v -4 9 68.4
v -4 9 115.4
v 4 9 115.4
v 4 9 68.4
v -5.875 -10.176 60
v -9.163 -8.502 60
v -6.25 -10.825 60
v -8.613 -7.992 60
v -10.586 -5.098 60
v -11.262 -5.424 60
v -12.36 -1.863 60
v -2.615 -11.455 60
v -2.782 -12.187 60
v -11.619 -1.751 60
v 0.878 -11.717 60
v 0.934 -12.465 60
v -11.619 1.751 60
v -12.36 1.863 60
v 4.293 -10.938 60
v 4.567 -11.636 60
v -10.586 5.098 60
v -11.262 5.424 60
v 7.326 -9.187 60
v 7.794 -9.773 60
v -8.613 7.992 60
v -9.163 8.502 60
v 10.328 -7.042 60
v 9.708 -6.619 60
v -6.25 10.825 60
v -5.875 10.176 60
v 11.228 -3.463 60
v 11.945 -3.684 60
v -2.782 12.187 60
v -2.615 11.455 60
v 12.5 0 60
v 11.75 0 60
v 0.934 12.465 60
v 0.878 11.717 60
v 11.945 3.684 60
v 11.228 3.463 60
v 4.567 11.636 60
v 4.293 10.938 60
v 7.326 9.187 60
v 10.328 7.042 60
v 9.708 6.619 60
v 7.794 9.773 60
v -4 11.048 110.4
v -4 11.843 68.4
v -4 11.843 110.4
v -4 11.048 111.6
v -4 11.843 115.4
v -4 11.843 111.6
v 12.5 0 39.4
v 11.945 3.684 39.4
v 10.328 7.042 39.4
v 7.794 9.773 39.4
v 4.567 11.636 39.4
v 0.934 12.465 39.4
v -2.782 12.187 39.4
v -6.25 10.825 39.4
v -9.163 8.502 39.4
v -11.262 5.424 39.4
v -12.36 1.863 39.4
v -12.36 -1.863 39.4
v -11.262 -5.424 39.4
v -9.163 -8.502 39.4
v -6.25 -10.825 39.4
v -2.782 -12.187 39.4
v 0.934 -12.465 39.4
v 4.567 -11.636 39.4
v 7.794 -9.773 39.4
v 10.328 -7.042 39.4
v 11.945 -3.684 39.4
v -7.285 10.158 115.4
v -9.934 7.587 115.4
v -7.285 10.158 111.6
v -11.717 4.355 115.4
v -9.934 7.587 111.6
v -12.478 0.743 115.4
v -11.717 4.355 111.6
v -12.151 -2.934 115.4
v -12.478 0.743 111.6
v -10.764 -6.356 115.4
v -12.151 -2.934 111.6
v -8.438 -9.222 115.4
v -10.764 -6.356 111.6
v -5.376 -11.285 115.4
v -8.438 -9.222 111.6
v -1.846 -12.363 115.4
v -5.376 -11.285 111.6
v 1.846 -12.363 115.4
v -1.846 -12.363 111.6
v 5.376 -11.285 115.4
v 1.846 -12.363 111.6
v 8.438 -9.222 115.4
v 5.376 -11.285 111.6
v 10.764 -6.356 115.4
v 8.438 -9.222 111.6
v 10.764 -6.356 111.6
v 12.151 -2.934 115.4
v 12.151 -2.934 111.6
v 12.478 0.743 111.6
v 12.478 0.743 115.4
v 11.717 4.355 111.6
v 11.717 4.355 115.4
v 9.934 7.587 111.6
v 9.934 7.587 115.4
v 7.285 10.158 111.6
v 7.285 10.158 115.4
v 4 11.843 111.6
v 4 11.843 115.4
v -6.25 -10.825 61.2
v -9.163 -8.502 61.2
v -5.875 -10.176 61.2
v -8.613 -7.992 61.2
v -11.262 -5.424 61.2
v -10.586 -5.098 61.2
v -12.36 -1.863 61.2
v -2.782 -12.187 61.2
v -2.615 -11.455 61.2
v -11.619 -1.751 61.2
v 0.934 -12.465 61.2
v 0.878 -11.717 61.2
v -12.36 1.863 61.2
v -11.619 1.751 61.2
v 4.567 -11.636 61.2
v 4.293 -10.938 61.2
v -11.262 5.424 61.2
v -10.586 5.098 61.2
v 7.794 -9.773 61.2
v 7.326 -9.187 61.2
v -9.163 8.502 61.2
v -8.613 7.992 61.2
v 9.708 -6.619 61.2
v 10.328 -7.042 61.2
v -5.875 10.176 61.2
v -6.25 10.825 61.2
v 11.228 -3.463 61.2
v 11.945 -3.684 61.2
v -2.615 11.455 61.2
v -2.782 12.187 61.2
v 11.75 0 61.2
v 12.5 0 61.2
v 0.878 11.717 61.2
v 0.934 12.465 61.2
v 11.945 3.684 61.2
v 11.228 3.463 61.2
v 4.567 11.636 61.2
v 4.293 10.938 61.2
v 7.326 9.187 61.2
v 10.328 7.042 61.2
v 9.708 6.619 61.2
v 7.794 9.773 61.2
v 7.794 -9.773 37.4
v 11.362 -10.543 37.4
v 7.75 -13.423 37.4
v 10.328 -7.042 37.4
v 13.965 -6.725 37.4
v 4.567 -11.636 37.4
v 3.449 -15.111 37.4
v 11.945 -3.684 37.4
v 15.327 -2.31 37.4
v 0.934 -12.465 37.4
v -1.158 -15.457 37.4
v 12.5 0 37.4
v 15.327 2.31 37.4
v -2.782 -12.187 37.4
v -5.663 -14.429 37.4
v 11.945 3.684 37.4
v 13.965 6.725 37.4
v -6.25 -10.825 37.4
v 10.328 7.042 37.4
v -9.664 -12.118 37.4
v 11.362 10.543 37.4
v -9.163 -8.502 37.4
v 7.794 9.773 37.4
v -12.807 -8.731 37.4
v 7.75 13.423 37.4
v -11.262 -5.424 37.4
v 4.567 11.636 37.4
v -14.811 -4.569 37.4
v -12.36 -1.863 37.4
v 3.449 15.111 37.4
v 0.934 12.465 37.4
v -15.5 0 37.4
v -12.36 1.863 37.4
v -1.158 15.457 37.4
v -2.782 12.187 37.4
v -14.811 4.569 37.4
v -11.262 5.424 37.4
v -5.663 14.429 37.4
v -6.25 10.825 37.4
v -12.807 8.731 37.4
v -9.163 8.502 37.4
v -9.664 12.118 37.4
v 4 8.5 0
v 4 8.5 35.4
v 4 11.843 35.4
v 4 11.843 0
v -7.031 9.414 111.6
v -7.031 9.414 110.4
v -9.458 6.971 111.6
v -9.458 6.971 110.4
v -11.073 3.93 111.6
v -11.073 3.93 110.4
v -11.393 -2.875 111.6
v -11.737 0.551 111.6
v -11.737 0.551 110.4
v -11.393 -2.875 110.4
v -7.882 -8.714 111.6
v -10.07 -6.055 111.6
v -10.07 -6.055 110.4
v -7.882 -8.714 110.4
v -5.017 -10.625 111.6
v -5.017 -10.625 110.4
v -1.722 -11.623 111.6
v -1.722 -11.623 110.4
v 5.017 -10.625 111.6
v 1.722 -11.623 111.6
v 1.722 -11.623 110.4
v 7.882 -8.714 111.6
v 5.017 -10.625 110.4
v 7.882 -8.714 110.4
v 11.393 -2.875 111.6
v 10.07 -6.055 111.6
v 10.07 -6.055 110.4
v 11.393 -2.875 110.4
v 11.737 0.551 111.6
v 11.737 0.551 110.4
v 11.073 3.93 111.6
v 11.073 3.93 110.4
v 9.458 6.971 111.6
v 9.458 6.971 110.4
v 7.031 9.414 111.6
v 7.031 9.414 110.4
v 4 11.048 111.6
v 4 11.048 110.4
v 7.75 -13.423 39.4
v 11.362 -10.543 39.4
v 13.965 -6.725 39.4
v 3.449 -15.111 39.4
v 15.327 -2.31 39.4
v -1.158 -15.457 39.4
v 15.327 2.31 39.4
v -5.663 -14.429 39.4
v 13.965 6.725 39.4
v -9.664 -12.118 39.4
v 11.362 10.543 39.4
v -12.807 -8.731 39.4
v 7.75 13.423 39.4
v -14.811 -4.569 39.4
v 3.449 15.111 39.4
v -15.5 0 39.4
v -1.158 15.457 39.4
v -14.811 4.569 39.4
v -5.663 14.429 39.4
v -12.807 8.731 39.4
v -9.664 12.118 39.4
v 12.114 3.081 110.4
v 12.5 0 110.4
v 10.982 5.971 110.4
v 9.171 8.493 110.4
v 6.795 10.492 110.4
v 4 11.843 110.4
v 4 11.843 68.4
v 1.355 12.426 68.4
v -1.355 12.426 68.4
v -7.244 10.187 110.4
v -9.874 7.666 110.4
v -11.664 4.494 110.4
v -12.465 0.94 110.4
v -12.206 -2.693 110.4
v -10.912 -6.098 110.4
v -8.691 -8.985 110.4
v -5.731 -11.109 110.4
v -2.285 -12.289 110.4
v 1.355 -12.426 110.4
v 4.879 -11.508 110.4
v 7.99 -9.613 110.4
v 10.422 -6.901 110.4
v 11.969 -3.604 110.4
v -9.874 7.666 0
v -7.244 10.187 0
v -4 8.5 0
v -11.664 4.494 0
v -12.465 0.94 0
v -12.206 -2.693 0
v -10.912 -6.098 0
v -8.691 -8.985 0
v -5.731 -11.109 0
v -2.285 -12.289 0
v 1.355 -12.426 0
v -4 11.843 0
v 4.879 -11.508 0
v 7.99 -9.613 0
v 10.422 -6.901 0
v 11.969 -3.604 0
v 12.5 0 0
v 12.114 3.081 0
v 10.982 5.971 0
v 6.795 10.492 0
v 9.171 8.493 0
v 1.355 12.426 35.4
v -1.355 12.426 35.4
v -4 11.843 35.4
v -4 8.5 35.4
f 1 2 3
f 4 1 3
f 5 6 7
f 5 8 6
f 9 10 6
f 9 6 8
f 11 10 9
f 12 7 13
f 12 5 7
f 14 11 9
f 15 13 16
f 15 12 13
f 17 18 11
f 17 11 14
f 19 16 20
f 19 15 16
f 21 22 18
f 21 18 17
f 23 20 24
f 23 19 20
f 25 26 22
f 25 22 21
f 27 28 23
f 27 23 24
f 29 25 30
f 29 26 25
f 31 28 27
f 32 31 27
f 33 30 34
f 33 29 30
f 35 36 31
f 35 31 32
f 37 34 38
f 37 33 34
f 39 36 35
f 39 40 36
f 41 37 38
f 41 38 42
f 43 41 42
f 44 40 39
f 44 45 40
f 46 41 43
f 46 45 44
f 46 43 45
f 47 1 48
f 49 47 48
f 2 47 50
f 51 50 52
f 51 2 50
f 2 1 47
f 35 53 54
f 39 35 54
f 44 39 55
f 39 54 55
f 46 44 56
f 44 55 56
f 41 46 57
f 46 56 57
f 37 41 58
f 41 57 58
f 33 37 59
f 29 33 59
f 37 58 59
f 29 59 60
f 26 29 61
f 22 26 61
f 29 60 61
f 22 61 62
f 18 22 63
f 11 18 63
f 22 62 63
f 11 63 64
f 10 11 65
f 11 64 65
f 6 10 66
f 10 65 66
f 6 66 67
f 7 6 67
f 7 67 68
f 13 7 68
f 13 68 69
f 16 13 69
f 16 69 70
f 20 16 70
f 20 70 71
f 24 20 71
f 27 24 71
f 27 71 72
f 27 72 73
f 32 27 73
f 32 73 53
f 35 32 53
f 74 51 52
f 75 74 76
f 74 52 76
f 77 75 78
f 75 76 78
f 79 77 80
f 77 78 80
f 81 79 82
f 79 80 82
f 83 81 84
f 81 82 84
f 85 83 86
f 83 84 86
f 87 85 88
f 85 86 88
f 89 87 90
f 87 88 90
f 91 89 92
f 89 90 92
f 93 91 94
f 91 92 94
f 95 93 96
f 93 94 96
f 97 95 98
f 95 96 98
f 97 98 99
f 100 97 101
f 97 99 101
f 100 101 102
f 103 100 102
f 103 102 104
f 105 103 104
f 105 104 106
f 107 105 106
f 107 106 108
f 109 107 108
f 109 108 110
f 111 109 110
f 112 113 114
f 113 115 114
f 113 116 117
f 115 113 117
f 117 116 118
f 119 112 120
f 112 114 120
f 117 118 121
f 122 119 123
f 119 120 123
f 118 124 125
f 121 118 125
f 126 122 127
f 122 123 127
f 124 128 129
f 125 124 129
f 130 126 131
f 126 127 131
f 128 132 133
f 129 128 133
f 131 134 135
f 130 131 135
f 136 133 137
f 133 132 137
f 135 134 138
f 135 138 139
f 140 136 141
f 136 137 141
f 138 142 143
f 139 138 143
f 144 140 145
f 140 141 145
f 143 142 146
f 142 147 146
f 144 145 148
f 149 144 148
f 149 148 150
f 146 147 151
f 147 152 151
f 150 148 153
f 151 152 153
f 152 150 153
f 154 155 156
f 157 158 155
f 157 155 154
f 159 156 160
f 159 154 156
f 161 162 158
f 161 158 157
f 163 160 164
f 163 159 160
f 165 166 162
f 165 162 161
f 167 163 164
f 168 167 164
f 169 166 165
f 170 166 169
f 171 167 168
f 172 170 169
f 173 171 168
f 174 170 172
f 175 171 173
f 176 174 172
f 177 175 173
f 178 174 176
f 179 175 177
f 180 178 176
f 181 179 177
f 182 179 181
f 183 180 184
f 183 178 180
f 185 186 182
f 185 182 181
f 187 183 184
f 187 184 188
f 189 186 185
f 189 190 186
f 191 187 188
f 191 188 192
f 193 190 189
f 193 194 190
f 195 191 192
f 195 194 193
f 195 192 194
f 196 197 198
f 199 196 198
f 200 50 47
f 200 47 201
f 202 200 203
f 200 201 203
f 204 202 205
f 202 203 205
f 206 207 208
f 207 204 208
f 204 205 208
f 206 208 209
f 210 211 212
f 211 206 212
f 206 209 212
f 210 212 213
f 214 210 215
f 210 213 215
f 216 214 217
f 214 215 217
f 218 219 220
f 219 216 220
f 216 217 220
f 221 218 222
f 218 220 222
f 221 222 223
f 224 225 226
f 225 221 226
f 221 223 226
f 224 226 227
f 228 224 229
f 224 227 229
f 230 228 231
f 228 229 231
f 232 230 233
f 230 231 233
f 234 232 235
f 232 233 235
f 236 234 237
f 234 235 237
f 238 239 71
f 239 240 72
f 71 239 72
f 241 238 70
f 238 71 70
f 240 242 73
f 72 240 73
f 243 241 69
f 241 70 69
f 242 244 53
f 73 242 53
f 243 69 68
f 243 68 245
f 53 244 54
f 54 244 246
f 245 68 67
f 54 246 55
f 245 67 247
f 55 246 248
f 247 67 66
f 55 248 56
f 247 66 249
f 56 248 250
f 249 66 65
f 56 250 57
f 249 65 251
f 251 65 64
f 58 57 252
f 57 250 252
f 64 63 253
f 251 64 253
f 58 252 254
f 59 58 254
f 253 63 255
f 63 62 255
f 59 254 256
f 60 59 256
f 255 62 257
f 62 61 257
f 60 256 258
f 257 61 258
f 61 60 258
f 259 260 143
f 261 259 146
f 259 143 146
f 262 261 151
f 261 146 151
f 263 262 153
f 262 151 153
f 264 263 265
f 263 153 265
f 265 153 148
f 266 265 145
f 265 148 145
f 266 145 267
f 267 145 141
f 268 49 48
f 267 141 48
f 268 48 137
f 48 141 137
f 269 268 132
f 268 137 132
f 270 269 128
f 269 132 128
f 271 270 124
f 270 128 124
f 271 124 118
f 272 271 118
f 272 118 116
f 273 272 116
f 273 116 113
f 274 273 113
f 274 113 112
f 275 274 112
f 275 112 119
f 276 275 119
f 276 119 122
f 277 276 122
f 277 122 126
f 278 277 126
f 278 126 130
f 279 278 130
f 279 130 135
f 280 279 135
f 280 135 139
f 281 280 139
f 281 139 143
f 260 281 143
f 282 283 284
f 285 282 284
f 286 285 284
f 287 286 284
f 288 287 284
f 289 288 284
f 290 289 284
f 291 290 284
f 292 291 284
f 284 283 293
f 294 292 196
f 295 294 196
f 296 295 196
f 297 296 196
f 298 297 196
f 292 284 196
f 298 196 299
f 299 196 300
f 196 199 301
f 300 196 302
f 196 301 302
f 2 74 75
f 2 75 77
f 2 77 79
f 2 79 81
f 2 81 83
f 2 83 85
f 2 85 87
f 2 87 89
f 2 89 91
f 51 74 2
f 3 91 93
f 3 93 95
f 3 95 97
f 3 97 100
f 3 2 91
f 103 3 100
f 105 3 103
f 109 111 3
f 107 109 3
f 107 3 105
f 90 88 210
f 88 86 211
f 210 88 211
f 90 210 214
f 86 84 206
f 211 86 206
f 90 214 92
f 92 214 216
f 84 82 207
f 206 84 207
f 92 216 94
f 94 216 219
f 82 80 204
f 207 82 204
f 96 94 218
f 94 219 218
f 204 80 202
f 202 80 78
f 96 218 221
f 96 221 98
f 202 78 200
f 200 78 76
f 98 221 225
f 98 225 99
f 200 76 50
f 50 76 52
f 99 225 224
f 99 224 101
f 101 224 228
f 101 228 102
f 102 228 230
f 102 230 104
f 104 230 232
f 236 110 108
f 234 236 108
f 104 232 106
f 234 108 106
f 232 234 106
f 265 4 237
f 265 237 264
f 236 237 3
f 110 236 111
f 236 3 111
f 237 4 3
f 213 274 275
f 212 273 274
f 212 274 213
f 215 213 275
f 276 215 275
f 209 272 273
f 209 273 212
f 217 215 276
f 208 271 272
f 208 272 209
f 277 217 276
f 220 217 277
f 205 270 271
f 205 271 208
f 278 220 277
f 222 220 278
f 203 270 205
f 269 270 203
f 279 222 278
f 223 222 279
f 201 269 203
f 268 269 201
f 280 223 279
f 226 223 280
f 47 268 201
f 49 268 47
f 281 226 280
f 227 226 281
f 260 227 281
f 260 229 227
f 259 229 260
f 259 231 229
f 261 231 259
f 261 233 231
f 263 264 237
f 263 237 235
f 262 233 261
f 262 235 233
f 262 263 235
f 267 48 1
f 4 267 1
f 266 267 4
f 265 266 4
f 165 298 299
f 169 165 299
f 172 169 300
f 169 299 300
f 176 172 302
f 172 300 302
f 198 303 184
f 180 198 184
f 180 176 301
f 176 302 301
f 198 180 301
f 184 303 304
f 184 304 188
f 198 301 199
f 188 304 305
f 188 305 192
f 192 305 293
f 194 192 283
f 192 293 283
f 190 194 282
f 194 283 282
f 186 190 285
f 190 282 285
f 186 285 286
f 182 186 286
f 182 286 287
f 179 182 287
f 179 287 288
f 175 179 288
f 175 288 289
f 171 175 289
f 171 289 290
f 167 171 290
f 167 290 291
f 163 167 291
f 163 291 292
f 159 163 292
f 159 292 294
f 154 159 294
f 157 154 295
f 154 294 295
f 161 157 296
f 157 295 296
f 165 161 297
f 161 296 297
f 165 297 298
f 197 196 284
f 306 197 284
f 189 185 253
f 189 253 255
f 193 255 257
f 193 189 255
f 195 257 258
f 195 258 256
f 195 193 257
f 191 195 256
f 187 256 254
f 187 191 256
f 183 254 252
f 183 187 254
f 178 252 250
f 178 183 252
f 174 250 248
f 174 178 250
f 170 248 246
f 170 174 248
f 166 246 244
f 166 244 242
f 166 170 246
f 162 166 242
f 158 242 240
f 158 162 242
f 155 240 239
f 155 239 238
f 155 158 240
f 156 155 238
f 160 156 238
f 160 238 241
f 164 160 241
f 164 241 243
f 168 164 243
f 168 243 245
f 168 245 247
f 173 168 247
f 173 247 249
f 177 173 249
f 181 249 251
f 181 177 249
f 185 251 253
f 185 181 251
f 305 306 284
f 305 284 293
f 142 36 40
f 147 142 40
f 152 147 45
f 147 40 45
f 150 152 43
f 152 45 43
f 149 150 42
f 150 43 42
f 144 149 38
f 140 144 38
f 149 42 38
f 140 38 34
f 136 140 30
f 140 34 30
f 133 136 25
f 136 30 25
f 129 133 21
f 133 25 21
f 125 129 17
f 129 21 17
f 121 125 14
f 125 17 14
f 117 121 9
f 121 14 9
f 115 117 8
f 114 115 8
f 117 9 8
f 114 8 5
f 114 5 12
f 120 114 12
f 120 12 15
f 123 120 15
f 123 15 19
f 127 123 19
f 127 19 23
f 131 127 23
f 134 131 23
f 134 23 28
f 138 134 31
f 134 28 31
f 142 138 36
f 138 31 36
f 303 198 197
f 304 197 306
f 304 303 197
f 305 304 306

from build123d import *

# Parameters (mm, degrees)
SKETCH1_R           = 12.5
BOSS_EXTRUDE1_DEPTH = 115.4
SKETCH4_W           = 8
SKETCH4_H           = 8
CUT_EXTRUDE1_DEPTH  = 35.4
SKETCH11_R          = 15.5
BOSS_EXTRUDE4_DEPTH = 2
SKETCH12_R          = 12.5
SKETCH12_R_2        = 11.75
CUT_EXTRUDE2_DEPTH  = 1.2
SKETCH13_W          = 8
SKETCH13_H          = 7
CUT_EXTRUDE3_DEPTH  = 47
SKETCH16_R          = 12.5
SKETCH16_R_2        = 11.75
CUT_EXTRUDE5_DEPTH  = 1.2


with BuildPart() as part:
    # Sketch1 → Boss-Extrude1 (new body)
    with BuildSketch(Plane.XY):
        Circle(SKETCH1_R)
    extrude(amount=BOSS_EXTRUDE1_DEPTH)

    # Sketch4 → Cut-Extrude1 (cut)
    with BuildSketch(Plane(origin=(0, 0, 0), x_dir=(-1, 0, 0), z_dir=(0, 0, -1))):
        with Locations((0, 12.5)):
            Rectangle(SKETCH4_W, SKETCH4_H)
    extrude(amount=-CUT_EXTRUDE1_DEPTH, mode=Mode.SUBTRACT)

    # Sketch11 → Boss-Extrude4 (add)
    with BuildSketch(Plane(origin=(0, 0, 37.4), x_dir=(-1, 0, 0), z_dir=(0, 0, -1))):
        Circle(SKETCH11_R)
    extrude(amount=-BOSS_EXTRUDE4_DEPTH)

    # Sketch12 → Cut-Extrude2 (cut)
    with BuildSketch(Plane.XY.offset(60)):
        Circle(SKETCH12_R)
        Circle(SKETCH12_R_2, mode=Mode.SUBTRACT)
    extrude(amount=CUT_EXTRUDE2_DEPTH, mode=Mode.SUBTRACT)

    # Sketch13 → Cut-Extrude3 (cut)
    with BuildSketch(Plane.XY.offset(115.4)):
        with Locations((0, 12.5)):
            Rectangle(SKETCH13_W, SKETCH13_H)
    extrude(amount=-CUT_EXTRUDE3_DEPTH, mode=Mode.SUBTRACT)

    # Sketch16 → Cut-Extrude5 (cut)
    with BuildSketch(Plane.XY.offset(110.4)):
        Circle(SKETCH16_R)
        Circle(SKETCH16_R_2, mode=Mode.SUBTRACT)
    extrude(amount=CUT_EXTRUDE5_DEPTH, mode=Mode.SUBTRACT)


solid = part.part
